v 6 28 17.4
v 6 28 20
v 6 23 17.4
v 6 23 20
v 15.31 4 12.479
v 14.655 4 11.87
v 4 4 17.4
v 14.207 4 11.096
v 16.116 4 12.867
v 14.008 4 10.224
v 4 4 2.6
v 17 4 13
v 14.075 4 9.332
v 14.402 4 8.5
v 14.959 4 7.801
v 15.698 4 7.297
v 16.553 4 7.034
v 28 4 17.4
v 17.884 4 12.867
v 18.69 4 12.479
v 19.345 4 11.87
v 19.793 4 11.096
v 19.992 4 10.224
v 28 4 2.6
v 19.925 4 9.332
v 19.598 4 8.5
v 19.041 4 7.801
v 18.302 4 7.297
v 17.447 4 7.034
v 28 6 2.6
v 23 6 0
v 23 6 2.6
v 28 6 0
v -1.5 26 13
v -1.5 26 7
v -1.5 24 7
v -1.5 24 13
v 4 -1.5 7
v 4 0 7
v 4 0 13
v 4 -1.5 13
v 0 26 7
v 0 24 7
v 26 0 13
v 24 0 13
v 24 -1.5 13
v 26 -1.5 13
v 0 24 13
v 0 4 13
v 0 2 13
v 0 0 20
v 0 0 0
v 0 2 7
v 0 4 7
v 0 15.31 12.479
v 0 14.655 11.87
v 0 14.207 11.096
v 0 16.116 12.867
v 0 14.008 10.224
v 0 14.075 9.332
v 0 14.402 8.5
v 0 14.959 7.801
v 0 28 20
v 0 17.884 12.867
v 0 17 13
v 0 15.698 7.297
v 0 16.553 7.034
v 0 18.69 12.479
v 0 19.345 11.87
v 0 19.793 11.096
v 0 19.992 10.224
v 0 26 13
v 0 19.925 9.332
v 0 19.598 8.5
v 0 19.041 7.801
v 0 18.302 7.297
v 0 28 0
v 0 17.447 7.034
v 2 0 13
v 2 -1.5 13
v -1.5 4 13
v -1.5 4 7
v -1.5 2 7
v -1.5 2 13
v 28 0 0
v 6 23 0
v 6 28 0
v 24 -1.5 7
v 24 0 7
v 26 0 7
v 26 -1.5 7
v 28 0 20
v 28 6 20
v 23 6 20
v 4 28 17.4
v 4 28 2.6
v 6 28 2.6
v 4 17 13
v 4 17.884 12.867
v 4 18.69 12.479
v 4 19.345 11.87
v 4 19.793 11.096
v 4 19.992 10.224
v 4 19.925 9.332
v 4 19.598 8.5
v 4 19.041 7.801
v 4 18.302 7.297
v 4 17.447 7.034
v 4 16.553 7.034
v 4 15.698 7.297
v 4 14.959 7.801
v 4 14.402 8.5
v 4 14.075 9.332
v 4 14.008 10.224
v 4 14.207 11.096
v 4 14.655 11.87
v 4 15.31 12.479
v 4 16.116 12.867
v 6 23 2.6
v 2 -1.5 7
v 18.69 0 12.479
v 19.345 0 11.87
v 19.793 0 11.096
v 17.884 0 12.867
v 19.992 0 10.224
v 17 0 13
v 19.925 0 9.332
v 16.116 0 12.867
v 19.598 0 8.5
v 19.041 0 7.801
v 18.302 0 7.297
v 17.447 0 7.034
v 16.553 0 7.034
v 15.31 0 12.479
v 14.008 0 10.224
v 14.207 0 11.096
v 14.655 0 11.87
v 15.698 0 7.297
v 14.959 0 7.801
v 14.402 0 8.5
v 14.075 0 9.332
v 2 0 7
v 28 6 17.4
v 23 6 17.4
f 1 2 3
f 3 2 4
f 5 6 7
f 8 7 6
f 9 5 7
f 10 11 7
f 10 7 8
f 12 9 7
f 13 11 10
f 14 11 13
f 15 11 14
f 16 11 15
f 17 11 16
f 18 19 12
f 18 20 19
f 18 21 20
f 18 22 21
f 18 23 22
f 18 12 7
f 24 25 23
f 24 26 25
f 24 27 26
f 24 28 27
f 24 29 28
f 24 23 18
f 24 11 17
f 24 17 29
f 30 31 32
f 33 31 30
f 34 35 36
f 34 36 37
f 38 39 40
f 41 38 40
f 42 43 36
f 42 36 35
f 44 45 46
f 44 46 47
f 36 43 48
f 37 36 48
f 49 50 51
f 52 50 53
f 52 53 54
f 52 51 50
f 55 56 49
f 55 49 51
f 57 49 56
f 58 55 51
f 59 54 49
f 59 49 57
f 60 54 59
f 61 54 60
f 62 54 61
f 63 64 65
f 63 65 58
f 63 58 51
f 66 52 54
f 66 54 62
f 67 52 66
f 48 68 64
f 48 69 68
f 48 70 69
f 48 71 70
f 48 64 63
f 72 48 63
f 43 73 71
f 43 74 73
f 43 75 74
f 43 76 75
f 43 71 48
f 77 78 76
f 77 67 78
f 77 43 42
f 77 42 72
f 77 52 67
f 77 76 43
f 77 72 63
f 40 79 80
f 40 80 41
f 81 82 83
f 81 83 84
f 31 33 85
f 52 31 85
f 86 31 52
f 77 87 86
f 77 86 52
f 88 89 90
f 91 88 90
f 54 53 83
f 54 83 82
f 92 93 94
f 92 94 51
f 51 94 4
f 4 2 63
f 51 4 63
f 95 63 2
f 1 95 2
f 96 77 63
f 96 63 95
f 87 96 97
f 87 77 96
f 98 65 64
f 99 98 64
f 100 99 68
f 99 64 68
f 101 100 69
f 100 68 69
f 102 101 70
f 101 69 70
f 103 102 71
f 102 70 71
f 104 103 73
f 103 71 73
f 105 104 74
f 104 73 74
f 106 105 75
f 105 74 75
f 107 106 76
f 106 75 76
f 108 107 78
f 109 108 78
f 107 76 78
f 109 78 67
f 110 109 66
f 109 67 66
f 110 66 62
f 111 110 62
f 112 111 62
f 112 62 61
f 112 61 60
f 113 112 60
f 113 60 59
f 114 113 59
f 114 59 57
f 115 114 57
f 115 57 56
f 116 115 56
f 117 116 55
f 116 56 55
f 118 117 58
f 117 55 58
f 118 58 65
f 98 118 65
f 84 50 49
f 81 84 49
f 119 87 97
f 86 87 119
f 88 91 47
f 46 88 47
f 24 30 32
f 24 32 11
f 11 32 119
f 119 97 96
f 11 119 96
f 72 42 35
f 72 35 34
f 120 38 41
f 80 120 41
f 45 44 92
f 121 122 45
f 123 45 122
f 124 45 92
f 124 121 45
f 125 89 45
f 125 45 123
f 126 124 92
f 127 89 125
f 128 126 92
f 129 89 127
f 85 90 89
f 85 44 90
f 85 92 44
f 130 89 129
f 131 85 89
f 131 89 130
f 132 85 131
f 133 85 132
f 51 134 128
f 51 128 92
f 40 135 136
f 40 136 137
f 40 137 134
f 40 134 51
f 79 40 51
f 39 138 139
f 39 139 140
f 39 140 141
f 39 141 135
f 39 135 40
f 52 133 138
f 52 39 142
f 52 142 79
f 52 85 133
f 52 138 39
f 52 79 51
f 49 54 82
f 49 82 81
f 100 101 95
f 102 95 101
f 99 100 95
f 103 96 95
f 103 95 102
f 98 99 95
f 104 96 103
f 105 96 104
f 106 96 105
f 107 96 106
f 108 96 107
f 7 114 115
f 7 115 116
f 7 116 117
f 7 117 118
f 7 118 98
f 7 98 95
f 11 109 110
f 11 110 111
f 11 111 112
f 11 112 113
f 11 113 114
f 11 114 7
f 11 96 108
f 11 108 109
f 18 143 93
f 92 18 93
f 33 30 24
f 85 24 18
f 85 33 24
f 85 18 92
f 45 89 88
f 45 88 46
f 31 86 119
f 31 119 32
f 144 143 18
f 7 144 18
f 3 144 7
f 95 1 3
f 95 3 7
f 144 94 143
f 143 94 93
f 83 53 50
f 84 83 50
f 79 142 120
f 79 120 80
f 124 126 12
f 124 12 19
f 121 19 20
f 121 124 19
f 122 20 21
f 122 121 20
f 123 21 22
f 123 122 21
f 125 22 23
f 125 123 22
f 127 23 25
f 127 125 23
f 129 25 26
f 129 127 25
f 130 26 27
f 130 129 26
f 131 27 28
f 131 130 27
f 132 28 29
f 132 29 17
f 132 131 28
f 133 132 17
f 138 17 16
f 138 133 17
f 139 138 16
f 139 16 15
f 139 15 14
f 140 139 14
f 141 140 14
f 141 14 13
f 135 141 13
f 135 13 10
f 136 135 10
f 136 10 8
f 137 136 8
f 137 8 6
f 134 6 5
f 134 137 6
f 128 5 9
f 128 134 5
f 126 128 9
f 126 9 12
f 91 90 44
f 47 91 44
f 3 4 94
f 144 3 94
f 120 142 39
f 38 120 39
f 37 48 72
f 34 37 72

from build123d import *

# Parameters (mm, degrees)
EXTRUDE_1_DEPTH     = 20
EXTRUDE_2_DEPTH     = 2.6
SKETCH_3_W          = 6
SKETCH_3_H          = 2
EXTRUDE_3_DEPTH     = 1.5
SKETCH_4_R          = 3
CUT_EXTRUDE_1_DEPTH = 4


with BuildPart() as part:
    # 草图1 → 凸台-拉伸1 (new body)
    with BuildSketch(Plane.XY):
        Polygon((0, 0), (0, 28), (4, 28), (4, 4), (28, 4), (28, 0), align=None)
    extrude(amount=EXTRUDE_1_DEPTH)

    # 草图2 → 凸台-拉伸2 (add)
    with BuildSketch(Plane.XY.offset(20)):
        Polygon((4, 28), (6, 28), (6, 23), (23, 6), (28, 6), (28, 4), (4, 4), align=None)
    extrude_2 = extrude(amount=-EXTRUDE_2_DEPTH)

    # 镜向1: 凸台-拉伸2 across plane
    add(extrude_2.mirror(Plane(origin=(0, 0, 10), x_dir=(1, 0, 0), z_dir=(0, 0, -1))))

    # 草图3 → 凸台-拉伸3 (add)
    with BuildSketch(Plane.ZY):
        with Locations((10, 25)):
            Rectangle(SKETCH_3_W, SKETCH_3_H)
        with Locations((10, 3)):
            Rectangle(SKETCH_3_W, SKETCH_3_H)
    extrude_3 = extrude(amount=EXTRUDE_3_DEPTH)

    # 镜向2: 凸台-拉伸3 across plane
    add(extrude_3.mirror(Plane(origin=(0, 0, 0), x_dir=(0, 0, 1), z_dir=(-0.707106781, 0.707106781, 0))))

    # 草图4 → 切除-拉伸1 (cut)
    with BuildSketch(Plane.ZY):
        with Locations((10, 17)):
            Circle(SKETCH_4_R)
    cut_extrude_1 = extrude(amount=-CUT_EXTRUDE_1_DEPTH, mode=Mode.SUBTRACT)

    # 镜向3: 切除-拉伸1 across plane
    add(cut_extrude_1.mirror(Plane(origin=(0, 0, 0), x_dir=(0, 0, 1), z_dir=(-0.707106781, 0.707106781, 0))), mode=Mode.SUBTRACT)


solid = part.part
